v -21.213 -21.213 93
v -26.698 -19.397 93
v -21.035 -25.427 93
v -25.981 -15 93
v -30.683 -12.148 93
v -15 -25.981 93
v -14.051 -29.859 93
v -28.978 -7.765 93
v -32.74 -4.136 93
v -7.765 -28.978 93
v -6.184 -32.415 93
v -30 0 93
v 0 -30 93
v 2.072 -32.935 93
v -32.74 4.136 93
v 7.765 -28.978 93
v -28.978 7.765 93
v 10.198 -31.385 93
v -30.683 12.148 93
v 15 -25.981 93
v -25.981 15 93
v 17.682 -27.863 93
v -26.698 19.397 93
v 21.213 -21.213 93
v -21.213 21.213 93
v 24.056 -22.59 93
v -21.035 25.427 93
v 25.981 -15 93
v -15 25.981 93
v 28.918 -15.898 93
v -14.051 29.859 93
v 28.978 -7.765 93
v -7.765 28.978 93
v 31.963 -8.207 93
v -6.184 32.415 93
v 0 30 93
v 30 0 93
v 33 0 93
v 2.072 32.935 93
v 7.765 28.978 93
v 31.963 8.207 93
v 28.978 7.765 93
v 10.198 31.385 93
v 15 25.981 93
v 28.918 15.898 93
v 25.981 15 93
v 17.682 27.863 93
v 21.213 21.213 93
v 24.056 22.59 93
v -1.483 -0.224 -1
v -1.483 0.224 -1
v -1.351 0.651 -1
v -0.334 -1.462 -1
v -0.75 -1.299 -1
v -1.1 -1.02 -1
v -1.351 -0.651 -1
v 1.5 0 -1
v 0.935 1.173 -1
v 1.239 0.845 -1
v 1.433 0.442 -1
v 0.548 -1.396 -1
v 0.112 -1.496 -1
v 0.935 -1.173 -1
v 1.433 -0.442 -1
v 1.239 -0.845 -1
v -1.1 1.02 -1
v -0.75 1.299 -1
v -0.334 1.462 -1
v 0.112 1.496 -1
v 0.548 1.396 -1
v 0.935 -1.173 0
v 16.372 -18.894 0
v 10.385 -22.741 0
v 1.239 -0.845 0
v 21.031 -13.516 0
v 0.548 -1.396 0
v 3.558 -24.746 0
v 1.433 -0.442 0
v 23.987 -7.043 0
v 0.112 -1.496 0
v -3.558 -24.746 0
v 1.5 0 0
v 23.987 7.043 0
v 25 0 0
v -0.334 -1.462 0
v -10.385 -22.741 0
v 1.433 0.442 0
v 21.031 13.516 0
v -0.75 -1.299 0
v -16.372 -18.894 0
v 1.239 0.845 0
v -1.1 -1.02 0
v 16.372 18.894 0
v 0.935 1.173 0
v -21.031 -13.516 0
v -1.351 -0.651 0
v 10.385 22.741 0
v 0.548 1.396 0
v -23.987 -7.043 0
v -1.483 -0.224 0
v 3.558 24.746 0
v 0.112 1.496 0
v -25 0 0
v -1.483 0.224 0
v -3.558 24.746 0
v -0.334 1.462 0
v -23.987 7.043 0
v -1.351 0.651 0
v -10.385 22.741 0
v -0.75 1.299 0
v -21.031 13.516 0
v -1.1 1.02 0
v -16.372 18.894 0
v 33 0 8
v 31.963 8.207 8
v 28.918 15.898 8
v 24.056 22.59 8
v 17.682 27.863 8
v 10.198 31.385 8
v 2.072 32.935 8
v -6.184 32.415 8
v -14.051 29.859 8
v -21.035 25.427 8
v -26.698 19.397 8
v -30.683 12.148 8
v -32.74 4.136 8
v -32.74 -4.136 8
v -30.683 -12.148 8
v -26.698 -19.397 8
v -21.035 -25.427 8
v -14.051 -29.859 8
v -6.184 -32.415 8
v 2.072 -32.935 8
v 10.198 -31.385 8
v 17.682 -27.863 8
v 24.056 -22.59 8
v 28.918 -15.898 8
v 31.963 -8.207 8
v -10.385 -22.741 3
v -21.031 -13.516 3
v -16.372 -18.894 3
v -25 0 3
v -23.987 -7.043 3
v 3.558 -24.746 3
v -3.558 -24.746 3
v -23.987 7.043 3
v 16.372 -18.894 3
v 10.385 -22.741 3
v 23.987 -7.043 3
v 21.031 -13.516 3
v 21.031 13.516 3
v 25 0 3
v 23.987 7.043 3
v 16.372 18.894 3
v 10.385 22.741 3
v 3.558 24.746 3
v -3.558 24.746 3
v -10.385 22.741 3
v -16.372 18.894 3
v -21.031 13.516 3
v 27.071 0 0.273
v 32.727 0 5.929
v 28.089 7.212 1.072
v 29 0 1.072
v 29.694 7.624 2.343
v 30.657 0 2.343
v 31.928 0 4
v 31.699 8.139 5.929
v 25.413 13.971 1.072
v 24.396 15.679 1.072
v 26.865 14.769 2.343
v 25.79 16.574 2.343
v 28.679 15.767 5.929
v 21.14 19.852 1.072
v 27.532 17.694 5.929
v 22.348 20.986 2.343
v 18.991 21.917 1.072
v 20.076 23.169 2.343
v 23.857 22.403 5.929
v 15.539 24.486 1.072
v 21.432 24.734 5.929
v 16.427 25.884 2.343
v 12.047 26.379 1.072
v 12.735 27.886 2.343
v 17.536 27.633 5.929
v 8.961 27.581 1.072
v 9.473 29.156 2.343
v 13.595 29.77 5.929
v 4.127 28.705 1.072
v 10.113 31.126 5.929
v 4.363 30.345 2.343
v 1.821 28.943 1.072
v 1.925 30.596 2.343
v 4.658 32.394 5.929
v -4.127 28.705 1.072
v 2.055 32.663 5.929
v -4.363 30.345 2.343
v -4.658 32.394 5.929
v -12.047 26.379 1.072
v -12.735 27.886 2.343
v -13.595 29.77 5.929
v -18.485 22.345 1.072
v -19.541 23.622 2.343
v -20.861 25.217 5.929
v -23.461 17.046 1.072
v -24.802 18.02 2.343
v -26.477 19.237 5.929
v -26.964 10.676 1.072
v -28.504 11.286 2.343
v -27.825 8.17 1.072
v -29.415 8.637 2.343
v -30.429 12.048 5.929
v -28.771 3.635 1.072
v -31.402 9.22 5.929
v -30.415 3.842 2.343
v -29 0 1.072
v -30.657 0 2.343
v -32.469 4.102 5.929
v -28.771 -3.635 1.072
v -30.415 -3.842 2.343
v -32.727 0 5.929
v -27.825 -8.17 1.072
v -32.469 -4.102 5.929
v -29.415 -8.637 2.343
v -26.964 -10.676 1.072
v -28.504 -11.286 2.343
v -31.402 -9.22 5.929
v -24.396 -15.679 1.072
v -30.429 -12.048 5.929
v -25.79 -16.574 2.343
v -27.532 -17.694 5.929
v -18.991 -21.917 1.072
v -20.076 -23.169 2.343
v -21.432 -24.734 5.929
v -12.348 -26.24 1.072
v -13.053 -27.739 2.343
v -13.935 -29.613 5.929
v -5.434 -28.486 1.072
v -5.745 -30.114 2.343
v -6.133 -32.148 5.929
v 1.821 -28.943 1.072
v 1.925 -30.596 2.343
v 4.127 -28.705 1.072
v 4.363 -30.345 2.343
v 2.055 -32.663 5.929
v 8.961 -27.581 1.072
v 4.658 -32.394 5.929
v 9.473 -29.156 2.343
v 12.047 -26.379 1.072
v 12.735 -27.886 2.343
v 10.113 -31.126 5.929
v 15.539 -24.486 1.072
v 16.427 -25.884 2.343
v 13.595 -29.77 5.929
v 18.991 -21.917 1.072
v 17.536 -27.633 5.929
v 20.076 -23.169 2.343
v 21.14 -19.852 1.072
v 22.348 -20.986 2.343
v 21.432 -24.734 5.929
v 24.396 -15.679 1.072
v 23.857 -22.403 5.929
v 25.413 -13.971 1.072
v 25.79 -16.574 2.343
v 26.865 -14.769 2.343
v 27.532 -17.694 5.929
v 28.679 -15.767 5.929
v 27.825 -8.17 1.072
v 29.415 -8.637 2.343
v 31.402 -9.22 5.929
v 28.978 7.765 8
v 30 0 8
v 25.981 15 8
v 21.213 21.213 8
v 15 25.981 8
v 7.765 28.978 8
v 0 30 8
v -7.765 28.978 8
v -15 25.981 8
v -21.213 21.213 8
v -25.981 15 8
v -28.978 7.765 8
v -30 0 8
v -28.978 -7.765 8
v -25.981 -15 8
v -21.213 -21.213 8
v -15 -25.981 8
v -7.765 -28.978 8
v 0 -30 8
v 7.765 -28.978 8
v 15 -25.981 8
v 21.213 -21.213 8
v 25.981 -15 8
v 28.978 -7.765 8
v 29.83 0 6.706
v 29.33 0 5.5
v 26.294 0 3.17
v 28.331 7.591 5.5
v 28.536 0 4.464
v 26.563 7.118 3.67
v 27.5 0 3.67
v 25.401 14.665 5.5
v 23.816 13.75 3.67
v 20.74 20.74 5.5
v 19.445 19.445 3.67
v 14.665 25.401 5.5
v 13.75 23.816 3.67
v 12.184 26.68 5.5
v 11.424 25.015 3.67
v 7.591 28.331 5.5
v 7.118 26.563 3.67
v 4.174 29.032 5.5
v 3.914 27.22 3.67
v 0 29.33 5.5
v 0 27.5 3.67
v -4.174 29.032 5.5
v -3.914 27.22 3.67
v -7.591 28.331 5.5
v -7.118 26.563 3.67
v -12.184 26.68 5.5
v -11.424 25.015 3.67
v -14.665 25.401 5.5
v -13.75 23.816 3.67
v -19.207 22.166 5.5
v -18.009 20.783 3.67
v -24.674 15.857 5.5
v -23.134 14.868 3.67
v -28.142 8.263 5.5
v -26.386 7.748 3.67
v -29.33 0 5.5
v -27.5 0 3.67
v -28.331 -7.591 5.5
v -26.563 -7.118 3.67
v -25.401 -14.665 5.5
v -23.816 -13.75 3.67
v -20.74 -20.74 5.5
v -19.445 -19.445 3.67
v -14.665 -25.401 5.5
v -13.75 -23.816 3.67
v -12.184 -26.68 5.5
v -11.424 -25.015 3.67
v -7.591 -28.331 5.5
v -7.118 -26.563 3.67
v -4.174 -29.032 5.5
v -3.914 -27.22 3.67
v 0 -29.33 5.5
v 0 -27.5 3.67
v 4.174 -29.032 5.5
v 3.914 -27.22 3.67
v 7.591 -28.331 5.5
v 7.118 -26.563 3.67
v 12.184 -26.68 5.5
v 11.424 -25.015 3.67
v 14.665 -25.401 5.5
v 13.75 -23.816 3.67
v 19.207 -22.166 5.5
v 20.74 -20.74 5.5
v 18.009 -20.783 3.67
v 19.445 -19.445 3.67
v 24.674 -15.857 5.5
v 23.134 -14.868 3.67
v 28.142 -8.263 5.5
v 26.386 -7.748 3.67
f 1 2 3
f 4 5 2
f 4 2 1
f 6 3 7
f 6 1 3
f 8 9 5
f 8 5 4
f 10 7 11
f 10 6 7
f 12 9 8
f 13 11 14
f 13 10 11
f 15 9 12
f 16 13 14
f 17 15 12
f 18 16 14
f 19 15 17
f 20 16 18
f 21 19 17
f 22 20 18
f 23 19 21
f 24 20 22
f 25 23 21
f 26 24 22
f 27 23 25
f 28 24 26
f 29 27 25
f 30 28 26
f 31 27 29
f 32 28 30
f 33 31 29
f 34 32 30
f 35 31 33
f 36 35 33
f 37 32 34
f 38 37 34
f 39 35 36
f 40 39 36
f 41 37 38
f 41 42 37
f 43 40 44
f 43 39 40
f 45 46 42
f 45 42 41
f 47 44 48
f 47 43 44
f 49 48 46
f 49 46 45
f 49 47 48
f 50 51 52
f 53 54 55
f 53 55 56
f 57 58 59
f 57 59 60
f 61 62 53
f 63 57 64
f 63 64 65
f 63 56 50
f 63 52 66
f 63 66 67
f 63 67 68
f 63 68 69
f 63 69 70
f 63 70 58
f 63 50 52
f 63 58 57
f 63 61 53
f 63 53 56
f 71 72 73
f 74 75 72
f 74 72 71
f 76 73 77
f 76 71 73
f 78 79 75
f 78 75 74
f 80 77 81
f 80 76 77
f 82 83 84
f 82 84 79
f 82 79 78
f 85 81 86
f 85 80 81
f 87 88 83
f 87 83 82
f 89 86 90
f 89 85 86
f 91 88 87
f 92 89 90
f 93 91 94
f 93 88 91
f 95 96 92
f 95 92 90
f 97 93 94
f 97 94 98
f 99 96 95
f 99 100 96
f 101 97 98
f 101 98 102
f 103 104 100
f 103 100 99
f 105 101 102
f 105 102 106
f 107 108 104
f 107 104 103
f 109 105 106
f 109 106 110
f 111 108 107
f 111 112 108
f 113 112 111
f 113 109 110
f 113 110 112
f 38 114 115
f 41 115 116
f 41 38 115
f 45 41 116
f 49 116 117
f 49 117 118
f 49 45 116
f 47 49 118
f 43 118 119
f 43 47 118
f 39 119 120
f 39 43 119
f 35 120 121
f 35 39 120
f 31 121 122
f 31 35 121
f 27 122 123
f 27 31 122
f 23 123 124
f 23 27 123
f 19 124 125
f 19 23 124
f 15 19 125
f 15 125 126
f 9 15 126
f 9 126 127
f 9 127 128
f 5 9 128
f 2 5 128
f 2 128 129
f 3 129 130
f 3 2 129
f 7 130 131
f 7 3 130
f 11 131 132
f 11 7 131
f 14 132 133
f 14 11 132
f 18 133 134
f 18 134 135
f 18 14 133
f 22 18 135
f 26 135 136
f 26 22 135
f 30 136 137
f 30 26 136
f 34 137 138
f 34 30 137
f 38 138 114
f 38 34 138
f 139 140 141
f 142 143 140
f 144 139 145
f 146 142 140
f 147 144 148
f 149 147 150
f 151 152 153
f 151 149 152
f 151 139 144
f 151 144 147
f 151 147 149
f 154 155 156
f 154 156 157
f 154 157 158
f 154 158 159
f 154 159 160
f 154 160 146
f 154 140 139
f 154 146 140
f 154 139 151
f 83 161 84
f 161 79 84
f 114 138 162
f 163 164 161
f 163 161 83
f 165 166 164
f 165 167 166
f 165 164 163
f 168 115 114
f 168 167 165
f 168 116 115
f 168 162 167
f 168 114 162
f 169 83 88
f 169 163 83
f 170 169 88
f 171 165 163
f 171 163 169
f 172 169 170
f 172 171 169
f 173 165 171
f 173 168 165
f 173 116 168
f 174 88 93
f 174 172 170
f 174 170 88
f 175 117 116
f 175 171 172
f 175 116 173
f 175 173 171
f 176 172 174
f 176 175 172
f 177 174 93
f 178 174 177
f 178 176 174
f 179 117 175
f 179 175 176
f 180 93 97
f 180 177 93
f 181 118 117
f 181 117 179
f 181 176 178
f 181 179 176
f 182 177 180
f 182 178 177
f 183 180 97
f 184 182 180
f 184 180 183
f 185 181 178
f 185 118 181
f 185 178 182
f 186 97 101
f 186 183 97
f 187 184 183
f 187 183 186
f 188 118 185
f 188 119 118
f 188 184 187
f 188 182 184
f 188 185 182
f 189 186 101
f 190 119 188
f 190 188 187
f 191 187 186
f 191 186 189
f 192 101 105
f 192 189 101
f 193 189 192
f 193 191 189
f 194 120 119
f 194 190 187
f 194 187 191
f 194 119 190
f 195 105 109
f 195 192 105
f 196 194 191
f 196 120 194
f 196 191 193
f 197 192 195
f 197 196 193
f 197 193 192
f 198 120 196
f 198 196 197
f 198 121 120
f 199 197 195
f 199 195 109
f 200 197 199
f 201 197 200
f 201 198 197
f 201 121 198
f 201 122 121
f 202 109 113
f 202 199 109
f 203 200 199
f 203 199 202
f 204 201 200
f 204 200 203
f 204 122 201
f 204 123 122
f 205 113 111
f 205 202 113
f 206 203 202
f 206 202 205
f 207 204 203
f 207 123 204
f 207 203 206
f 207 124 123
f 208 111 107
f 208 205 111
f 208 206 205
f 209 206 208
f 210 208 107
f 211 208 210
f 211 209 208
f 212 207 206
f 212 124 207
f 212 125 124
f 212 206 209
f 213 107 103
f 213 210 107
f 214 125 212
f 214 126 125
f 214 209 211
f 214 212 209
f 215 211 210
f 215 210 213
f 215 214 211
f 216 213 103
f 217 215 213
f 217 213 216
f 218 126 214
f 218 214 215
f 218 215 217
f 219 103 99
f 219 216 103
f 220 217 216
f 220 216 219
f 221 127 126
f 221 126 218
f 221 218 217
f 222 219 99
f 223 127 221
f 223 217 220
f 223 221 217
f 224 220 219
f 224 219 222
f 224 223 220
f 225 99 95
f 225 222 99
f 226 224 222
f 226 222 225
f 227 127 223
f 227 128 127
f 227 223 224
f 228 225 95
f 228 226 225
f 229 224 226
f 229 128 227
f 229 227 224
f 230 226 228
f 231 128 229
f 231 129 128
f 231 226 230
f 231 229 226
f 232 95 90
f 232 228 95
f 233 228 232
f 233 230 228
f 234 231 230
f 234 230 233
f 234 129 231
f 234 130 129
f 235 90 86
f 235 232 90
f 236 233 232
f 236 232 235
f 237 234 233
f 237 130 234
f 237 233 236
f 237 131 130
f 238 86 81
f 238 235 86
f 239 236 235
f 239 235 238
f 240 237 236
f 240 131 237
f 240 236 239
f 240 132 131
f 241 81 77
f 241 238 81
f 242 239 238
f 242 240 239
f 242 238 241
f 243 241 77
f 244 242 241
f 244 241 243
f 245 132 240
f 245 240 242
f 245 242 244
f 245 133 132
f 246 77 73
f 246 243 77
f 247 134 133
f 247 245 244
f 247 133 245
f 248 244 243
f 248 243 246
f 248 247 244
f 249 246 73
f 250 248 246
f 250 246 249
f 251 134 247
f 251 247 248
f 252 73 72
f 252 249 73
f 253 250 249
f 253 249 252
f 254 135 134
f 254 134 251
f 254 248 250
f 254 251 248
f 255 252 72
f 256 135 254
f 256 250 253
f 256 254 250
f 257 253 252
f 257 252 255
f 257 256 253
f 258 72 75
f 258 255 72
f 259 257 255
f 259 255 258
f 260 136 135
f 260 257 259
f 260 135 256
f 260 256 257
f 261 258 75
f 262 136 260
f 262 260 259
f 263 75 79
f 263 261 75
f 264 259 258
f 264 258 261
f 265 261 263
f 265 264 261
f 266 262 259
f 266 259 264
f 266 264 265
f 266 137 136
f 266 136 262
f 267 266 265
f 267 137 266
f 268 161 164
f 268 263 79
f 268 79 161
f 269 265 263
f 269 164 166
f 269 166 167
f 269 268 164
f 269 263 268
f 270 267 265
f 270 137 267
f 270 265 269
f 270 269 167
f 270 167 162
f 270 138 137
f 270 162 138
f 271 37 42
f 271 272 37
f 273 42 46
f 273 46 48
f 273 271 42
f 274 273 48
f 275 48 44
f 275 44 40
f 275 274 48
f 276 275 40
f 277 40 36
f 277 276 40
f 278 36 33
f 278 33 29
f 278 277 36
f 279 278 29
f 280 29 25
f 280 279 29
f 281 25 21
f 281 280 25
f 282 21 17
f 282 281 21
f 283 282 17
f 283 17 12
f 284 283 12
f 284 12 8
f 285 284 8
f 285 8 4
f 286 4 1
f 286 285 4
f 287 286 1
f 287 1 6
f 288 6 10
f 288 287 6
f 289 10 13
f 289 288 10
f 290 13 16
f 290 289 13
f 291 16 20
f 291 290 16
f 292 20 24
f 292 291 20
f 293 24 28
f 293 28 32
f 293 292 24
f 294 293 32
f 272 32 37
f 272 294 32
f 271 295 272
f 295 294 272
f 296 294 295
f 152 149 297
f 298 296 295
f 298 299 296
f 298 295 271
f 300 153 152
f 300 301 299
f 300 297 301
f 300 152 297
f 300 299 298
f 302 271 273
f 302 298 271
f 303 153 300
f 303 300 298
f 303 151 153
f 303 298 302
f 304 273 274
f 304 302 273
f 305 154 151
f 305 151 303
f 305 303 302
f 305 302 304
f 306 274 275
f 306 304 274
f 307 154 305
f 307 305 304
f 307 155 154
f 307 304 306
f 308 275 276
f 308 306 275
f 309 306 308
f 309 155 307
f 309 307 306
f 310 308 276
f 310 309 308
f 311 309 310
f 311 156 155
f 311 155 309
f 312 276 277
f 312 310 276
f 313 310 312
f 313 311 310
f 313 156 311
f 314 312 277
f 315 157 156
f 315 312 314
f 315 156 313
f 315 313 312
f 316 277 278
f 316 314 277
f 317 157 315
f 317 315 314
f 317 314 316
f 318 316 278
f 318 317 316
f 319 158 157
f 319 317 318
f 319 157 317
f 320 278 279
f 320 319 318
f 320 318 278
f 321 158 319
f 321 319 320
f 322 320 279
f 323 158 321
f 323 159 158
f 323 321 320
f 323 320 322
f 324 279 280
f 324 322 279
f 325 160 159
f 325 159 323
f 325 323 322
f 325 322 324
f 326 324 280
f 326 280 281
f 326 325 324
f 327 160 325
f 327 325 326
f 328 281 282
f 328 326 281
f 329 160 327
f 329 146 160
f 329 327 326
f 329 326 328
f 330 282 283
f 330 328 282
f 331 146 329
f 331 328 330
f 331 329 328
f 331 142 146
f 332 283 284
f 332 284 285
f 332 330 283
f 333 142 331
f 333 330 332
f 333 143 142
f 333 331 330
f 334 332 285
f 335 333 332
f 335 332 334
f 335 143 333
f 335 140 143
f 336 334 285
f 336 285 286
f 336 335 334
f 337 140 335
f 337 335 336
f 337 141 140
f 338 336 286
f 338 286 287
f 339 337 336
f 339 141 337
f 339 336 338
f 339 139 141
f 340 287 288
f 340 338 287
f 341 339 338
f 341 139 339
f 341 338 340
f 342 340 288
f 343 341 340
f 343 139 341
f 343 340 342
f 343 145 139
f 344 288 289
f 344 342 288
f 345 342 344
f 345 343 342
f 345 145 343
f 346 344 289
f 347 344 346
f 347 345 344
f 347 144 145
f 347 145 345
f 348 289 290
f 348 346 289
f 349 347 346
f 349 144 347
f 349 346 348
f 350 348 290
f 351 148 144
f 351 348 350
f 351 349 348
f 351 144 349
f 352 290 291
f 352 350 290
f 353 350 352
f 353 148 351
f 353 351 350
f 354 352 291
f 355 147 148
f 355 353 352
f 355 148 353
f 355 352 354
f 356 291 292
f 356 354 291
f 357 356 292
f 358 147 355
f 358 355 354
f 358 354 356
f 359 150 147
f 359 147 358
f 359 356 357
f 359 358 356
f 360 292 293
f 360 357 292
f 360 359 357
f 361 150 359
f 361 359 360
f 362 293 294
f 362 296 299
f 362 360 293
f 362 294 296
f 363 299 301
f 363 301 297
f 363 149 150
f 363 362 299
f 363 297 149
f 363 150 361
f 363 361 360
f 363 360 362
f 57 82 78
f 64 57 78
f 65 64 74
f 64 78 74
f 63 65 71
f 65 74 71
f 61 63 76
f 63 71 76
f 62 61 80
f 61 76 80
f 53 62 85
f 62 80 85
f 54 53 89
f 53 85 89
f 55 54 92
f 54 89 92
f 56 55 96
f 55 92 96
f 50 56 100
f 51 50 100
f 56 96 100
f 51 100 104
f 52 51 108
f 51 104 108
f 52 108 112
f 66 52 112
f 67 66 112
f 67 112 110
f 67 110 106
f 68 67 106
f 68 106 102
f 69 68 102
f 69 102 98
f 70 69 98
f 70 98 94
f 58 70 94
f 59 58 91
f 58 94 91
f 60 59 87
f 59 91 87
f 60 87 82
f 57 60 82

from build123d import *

# Parameters (mm, degrees)
F2_R     = 1.5
F3_DEPTH = 1


with BuildPart() as f1:
    # F0 (on Front) → F1 (revolve)
    with BuildSketch(Plane.XZ):
        with BuildLine():
            Line((0, 3), (0, 0))
            Line((0, 0), (25, 0))
            ThreePointArc((25, 0), (30.656854, 2.343146), (33, 8))
            Line((33, 8), (33, 93))
            Line((33, 93), (30, 93))
            Line((30, 93), (30, 8))
            ThreePointArc((30, 8), (28.535534, 4.464466), (25, 3))
            Line((25, 3), (0, 3))
        make_face()
    revolve(axis=Axis((0, 0, 7.581016), (0, 0, 1)))

    # F2 (on face) → F3 (join)
    with BuildSketch(Plane(origin=(0, 0, 0), x_dir=(1, 0, 0), z_dir=(0, 0, -1))):
        Circle(F2_R)
    extrude(amount=F3_DEPTH)


solid = f1.part
